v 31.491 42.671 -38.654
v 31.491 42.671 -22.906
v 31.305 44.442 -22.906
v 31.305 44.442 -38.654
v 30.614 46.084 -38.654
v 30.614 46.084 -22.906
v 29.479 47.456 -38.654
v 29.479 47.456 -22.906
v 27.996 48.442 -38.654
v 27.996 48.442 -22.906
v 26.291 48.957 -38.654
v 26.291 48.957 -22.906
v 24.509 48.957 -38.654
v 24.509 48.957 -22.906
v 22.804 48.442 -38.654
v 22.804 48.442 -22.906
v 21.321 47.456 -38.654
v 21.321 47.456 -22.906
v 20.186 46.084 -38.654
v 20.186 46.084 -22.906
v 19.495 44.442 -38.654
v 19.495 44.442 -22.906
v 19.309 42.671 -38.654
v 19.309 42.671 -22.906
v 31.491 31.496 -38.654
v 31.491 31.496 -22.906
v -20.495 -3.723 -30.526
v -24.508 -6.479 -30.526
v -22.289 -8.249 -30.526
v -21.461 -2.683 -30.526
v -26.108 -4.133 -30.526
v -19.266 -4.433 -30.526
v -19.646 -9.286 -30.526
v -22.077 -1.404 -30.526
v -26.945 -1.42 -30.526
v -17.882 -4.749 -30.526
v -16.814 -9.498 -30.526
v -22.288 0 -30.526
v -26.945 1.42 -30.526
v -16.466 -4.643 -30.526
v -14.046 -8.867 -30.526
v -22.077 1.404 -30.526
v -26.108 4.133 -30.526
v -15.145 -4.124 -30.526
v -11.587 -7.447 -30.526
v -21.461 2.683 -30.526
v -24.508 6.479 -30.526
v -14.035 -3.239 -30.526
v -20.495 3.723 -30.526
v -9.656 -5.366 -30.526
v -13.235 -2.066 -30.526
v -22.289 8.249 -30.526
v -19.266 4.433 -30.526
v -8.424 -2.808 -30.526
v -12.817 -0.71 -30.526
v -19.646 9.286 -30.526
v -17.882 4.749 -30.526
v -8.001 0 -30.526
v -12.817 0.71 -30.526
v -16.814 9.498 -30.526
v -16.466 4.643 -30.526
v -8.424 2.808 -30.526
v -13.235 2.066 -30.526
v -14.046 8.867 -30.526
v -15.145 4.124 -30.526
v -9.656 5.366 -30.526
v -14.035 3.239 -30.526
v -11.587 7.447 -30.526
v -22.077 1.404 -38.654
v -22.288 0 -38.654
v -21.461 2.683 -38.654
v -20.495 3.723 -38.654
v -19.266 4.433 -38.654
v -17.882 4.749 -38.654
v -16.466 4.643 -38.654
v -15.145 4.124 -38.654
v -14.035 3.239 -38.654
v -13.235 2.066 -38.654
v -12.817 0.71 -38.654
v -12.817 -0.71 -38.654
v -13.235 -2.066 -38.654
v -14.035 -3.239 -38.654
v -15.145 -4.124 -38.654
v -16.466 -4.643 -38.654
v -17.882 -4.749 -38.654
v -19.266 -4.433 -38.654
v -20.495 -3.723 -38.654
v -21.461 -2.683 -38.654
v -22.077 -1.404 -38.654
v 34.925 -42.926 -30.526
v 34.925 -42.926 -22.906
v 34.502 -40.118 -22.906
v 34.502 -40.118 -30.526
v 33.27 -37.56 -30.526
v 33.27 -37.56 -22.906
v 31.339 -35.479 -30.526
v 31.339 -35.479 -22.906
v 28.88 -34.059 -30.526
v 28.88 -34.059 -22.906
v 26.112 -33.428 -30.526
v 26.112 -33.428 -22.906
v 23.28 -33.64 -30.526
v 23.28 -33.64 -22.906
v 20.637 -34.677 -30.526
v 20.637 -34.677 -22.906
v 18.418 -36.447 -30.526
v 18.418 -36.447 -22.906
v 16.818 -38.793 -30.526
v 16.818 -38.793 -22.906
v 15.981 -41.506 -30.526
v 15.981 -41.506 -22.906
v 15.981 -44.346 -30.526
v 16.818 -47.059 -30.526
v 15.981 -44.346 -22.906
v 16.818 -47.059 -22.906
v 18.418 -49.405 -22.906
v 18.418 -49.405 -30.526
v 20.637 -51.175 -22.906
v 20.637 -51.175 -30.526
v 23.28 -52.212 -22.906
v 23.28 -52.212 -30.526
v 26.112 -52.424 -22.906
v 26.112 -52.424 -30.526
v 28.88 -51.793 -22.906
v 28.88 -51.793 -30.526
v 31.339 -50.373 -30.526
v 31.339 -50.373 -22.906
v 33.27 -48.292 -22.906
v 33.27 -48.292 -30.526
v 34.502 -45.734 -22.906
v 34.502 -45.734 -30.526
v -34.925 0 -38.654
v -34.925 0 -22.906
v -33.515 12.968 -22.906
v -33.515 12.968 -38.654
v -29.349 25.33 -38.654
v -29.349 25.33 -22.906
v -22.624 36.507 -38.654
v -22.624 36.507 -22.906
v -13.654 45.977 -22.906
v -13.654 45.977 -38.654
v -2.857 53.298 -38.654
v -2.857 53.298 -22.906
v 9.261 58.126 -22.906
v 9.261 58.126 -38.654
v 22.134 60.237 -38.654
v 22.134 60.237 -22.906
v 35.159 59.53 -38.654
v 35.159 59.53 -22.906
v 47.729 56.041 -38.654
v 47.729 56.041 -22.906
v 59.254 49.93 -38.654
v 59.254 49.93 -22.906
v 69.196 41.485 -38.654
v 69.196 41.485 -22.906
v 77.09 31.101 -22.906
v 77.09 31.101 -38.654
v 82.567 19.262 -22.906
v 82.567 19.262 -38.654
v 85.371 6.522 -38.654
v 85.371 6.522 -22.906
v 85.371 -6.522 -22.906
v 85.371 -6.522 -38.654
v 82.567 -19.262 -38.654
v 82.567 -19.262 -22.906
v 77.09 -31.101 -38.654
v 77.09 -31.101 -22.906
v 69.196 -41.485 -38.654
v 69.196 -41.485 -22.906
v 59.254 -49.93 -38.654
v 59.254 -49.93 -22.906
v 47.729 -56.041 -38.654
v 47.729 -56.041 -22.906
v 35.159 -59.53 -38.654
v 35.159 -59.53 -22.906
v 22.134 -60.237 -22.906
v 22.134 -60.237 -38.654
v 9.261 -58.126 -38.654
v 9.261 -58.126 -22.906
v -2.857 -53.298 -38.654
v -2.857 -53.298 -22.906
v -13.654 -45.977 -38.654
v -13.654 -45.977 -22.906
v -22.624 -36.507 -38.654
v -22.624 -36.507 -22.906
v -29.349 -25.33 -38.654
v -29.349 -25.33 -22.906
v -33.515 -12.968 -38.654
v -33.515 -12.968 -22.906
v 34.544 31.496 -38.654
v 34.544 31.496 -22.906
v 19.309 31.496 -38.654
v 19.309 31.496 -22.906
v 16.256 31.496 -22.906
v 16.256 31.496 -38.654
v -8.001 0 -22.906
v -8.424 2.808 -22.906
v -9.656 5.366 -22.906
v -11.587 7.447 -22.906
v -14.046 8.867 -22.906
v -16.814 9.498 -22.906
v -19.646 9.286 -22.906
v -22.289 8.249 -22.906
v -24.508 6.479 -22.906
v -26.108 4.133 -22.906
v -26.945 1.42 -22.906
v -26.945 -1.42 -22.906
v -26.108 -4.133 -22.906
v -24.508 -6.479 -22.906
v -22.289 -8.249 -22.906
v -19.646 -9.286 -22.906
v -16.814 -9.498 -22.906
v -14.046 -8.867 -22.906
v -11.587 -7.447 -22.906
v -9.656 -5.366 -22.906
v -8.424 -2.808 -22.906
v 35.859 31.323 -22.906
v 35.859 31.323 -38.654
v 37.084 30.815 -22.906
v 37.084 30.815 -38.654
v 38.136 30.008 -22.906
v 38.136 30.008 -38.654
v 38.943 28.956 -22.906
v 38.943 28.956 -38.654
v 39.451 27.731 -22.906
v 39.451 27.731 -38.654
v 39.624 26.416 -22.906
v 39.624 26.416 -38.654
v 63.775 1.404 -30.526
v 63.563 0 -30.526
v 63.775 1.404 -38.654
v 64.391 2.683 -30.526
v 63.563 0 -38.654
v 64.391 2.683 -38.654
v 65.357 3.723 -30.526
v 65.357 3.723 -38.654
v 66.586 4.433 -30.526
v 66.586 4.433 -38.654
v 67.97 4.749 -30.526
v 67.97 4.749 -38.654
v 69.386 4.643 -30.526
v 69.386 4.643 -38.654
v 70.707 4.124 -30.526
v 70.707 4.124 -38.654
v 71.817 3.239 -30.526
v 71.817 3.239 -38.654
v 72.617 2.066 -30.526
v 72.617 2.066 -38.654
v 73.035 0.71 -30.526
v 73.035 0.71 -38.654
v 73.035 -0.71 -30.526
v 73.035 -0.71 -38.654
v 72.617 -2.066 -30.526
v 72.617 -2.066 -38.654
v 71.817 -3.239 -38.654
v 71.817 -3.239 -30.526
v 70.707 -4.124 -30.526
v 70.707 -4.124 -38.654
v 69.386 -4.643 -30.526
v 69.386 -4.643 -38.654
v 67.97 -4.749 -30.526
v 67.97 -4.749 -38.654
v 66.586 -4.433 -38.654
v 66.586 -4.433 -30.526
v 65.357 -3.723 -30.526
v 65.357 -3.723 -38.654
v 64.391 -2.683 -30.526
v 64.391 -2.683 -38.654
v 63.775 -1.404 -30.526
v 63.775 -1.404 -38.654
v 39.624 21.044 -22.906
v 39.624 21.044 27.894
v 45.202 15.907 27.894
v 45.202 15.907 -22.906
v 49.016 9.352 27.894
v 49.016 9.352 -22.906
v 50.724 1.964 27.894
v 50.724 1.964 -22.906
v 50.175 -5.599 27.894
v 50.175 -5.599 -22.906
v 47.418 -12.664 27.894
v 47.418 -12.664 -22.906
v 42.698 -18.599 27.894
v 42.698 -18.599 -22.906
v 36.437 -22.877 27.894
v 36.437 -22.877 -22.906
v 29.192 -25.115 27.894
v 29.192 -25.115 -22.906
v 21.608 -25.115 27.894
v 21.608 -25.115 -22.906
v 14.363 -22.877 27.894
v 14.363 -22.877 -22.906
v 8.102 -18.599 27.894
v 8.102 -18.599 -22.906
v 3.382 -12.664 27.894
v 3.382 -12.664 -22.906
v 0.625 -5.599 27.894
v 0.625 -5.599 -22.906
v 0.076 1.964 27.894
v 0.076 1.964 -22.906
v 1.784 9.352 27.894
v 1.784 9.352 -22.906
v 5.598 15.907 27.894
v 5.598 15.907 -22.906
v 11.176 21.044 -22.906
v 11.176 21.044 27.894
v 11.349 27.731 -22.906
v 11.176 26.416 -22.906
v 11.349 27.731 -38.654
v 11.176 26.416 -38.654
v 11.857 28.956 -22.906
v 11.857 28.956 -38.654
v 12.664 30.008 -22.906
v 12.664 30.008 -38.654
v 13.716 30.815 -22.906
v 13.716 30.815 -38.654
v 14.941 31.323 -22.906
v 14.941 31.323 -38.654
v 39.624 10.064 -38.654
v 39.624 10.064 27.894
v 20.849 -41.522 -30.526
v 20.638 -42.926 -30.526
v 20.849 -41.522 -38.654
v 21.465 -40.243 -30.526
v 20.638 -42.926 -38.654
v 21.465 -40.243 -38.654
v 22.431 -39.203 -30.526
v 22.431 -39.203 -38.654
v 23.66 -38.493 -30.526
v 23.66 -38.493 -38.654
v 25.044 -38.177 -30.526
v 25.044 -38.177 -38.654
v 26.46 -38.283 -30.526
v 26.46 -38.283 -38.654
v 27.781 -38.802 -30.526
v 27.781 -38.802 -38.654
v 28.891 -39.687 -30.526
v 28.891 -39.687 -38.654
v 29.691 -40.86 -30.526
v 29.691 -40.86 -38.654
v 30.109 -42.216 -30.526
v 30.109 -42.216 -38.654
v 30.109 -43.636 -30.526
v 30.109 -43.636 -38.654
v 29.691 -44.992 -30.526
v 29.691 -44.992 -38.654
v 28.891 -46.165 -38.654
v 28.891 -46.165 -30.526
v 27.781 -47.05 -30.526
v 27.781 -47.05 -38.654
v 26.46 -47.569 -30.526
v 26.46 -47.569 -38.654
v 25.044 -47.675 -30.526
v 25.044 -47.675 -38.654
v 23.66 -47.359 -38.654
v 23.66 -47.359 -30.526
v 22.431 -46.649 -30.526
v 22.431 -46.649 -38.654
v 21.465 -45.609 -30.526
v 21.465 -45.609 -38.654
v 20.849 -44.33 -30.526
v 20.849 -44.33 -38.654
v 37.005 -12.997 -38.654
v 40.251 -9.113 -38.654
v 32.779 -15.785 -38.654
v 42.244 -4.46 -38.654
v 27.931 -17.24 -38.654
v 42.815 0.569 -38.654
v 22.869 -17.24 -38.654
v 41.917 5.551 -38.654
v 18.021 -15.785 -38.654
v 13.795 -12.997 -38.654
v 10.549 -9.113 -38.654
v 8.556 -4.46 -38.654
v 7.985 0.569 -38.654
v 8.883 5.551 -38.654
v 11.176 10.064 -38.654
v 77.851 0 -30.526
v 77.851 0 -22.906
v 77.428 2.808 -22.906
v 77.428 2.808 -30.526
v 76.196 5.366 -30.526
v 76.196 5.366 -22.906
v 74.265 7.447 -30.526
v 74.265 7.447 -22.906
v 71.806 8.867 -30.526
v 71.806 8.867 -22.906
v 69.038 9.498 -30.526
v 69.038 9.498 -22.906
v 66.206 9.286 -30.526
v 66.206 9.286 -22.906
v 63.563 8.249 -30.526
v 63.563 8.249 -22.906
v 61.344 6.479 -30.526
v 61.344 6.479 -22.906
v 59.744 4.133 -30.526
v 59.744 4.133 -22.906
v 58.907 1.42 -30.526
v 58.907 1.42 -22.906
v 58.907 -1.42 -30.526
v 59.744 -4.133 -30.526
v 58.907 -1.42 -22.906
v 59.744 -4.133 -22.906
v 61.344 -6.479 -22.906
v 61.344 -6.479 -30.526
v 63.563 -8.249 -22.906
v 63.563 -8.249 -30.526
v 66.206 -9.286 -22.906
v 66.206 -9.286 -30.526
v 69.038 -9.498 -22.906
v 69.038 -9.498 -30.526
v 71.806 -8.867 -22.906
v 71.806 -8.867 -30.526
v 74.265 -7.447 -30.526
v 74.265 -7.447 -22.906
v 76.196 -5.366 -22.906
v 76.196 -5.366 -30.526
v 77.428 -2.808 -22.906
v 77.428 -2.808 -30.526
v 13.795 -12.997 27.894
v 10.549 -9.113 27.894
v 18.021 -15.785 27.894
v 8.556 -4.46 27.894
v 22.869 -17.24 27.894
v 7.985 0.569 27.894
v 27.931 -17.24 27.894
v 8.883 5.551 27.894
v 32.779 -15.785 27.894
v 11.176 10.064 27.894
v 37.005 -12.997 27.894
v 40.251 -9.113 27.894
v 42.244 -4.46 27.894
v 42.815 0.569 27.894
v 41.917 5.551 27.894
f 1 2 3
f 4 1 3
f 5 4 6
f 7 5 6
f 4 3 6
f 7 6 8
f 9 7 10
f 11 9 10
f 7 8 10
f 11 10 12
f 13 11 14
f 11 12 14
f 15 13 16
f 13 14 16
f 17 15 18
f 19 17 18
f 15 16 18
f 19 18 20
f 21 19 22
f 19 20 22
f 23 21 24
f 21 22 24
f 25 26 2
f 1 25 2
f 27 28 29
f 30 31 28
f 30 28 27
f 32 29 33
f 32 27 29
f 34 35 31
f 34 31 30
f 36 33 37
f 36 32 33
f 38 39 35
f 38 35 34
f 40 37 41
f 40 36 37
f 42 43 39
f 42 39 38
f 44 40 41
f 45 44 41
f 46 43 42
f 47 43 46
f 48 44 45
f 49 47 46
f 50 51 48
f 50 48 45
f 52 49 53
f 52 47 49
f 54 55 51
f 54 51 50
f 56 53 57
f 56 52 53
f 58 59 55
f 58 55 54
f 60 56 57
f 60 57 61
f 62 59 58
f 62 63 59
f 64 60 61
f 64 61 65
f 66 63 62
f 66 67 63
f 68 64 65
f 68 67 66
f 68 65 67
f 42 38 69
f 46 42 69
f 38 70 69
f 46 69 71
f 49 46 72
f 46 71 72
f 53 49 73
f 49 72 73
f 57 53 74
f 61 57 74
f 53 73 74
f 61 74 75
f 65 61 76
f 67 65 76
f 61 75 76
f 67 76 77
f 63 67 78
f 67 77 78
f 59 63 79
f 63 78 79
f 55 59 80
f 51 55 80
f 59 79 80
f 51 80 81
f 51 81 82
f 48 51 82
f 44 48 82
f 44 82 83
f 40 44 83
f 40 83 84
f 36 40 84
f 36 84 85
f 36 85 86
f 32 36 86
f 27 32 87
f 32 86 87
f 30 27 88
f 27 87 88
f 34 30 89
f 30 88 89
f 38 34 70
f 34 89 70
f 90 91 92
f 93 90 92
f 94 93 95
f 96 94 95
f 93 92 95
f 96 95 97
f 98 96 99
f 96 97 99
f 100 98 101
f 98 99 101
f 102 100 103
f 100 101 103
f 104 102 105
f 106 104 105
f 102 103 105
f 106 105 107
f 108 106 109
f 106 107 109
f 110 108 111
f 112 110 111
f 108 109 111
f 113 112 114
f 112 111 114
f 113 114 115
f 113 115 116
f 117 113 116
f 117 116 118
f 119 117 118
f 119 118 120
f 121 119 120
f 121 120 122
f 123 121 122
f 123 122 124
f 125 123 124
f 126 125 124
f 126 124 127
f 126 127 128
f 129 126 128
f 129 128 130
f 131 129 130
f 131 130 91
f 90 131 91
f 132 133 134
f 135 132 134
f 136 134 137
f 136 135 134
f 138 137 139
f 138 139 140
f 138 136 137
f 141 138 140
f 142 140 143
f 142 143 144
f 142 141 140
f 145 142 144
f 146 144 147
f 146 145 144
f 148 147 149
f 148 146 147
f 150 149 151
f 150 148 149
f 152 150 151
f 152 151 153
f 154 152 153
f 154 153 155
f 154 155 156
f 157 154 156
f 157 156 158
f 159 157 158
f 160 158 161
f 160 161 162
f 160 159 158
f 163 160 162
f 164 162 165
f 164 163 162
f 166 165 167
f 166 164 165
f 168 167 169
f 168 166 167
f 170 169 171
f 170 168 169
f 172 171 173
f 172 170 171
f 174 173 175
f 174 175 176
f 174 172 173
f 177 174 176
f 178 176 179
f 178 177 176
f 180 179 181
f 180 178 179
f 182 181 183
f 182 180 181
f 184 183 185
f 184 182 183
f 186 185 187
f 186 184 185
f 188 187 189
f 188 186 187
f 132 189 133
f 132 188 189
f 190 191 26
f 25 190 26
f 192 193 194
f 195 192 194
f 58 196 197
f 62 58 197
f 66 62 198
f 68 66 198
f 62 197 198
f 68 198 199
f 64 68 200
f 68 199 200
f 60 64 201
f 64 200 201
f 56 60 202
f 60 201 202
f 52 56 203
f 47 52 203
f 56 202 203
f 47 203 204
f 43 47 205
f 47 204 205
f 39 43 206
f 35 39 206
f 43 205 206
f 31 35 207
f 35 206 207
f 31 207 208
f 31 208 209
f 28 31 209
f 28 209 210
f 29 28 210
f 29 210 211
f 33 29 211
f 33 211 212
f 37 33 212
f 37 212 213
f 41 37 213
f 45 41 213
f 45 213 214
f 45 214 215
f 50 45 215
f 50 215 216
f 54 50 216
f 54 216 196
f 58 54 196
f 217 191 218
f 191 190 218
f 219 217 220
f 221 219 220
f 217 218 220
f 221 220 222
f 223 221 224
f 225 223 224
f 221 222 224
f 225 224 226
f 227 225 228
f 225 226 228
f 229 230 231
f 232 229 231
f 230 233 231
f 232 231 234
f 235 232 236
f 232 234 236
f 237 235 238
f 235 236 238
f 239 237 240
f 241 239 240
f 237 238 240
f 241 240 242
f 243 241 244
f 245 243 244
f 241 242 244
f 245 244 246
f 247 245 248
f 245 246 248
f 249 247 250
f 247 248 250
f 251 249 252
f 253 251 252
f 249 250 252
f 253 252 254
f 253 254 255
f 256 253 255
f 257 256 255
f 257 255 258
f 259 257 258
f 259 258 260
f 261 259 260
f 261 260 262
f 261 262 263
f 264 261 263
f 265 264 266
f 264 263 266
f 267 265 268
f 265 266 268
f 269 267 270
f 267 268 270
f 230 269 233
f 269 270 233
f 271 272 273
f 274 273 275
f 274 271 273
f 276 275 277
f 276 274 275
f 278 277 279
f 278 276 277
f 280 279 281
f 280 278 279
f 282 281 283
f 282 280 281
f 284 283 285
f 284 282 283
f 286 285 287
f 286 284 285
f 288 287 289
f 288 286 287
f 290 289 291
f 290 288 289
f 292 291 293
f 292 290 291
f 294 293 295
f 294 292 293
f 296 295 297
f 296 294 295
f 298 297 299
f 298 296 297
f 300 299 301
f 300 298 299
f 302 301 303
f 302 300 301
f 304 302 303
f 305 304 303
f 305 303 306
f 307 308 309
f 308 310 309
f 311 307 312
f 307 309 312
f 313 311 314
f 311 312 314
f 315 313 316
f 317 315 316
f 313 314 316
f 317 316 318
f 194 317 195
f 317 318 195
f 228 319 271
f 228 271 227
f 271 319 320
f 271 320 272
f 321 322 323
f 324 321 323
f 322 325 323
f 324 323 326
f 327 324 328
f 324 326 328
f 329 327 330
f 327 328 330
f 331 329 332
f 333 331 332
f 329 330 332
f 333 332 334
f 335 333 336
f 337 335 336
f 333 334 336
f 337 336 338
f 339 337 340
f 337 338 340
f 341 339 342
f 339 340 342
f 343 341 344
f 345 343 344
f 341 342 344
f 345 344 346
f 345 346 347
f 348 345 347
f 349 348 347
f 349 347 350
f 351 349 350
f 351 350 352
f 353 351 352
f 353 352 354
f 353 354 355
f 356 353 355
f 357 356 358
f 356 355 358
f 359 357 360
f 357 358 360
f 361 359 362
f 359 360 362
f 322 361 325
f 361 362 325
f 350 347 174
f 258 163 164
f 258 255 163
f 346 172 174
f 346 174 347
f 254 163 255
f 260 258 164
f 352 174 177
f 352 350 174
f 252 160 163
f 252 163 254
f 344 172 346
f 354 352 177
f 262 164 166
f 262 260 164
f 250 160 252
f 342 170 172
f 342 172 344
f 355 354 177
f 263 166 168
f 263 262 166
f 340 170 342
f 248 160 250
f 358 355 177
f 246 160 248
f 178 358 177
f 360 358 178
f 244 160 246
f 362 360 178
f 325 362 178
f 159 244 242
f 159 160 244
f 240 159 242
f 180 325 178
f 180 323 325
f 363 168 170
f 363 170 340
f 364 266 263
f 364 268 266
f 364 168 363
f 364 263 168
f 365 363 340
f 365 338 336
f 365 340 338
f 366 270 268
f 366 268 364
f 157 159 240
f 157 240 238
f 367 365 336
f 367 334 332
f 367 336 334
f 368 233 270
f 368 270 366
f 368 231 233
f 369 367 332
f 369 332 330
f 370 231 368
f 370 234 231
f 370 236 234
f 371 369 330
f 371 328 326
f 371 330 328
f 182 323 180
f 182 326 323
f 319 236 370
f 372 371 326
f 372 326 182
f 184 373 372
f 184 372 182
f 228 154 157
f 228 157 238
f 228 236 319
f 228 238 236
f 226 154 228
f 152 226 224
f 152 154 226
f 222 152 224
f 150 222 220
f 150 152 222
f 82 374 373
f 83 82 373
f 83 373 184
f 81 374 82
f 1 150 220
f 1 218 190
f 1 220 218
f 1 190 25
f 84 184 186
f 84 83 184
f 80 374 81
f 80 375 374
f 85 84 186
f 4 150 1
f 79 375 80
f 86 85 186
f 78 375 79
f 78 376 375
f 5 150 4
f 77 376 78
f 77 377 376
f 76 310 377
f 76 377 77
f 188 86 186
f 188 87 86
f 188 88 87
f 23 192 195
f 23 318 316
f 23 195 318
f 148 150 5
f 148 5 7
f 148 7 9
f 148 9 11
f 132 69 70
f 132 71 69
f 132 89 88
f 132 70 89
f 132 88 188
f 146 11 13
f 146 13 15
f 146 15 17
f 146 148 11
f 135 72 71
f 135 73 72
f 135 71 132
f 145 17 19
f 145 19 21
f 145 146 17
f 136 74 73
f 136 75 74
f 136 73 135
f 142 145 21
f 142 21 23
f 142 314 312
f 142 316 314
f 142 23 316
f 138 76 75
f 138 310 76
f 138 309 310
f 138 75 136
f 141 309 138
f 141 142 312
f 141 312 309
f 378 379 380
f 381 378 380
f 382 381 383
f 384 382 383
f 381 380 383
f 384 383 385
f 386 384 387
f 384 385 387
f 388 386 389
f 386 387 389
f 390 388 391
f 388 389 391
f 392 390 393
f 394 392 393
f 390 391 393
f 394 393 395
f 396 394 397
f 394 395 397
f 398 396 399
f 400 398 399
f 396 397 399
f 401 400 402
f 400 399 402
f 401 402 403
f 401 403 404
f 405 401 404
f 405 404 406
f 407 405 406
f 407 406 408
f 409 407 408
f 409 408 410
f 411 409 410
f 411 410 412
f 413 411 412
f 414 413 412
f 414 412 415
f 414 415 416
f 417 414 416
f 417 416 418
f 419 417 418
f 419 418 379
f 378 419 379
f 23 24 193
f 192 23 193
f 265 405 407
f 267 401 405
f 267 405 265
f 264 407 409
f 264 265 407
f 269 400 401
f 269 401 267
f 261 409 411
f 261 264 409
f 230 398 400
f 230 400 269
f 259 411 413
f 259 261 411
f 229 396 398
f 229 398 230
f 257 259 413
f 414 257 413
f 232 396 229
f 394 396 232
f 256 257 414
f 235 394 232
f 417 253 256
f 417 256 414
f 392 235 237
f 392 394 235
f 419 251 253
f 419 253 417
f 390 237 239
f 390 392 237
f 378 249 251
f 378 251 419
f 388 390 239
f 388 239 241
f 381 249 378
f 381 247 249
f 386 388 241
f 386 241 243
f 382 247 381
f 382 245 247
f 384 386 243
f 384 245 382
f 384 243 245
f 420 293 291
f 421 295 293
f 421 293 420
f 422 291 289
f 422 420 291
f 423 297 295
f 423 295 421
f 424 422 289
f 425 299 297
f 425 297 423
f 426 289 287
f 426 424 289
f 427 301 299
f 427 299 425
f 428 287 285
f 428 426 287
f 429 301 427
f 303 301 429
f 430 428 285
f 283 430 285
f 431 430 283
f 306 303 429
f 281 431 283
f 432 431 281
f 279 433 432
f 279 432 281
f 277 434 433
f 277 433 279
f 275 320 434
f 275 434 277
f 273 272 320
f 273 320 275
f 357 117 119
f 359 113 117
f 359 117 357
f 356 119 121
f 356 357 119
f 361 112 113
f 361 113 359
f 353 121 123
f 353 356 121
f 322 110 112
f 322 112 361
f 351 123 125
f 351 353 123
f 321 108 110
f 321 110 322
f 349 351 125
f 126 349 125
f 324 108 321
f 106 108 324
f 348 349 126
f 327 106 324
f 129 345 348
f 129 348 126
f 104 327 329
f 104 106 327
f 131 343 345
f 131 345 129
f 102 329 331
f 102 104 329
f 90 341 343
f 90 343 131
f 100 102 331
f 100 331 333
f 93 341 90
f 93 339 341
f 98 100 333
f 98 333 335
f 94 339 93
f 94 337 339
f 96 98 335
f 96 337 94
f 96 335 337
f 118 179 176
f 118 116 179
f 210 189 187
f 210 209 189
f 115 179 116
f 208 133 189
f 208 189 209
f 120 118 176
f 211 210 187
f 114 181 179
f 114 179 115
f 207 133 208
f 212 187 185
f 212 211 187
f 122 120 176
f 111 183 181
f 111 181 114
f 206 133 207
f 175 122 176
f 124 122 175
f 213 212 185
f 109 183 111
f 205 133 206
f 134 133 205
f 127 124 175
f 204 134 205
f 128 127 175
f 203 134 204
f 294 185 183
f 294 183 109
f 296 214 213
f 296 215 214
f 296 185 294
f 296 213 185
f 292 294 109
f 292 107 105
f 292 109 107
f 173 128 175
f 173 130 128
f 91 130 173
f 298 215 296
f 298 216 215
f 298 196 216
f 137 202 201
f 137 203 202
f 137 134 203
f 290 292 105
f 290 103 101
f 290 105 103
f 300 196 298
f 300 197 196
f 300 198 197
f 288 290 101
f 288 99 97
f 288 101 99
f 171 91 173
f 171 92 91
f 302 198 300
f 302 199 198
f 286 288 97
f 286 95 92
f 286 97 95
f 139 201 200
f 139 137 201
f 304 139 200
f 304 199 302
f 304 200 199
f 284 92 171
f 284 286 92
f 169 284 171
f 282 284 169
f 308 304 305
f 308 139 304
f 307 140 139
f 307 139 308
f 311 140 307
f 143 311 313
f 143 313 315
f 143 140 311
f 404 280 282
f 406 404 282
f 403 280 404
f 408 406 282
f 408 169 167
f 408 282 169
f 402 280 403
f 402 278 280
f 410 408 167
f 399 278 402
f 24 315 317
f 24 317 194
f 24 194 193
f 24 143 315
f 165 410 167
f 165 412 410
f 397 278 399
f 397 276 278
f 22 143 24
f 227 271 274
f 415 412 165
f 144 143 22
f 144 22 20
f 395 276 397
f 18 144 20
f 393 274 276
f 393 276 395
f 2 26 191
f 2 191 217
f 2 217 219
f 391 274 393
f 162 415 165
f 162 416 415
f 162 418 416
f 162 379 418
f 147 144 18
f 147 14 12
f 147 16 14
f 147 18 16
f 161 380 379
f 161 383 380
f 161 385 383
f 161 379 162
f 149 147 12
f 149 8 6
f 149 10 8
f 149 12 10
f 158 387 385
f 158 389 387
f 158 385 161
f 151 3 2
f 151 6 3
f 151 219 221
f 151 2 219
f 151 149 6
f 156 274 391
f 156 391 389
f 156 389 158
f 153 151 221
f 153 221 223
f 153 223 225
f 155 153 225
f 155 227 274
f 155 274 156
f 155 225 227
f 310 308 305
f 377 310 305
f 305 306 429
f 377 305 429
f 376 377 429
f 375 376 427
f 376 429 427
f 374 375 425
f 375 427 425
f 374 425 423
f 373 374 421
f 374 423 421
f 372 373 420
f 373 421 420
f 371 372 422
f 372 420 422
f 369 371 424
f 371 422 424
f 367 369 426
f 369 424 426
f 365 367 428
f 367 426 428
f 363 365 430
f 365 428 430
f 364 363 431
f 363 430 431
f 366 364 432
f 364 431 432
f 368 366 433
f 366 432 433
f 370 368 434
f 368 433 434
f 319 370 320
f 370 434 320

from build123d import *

# Parameters (mm, degrees)
F2_R           = 17.4244
F3_DEPTH       = 101.6
F5_D           = 9.525
F5_CBORE_D     = 19.05
F5_CBORE_DEPTH = 7.62
F7_DEPTH       = 838.2
F8_R           = 5.08


with BuildPart() as f1:
    # F0 (on Front) → F1 (revolve)
    with BuildSketch(Plane.XZ):
        Polygon((25.4, -38.654042), (25.4, 27.893958), (0, 27.893958), (0, -22.906042), (-34.925, -22.906042), (-34.925, -38.654042), align=None)
    revolve(axis=Axis((25.4, 0, -5.380042), (0, 0, -1)))

    # F2 (on face) → F3 (cut)
    with BuildSketch(Plane.XY.offset(27.893958)):
        with Locations((25.4, 0)):
            Circle(F2_R)
    extrude(amount=-F3_DEPTH, mode=Mode.SUBTRACT)

    # F5 (through all)
    with Locations(Plane.XY.offset(-22.906042)):
        with Locations((-17.526, 0), (25.4, -42.926), (68.326, 0)):
            CounterBoreHole(F5_D / 2, F5_CBORE_D / 2, F5_CBORE_DEPTH)

    # F6 (on face) → F7 (cut)
    with BuildSketch(Plane.XY.offset(27.893958)):
        with BuildLine():
            Line((11.176, 0), (39.624, 0))
            Line((39.624, 0), (39.624, 31.496))
            Line((39.624, 31.496), (31.490646, 31.496))
            Line((31.490646, 31.496), (31.490646, 42.67057))
            ThreePointArc((31.490646, 42.67057), (25.4, 49.022), (19.309354, 42.67057))
            Line((19.309354, 42.67057), (19.309354, 31.496))
            Line((19.309354, 31.496), (11.176, 31.496))
            Line((11.176, 31.496), (11.176, 0))
        make_face()
    extrude(amount=-F7_DEPTH, mode=Mode.SUBTRACT)

    # F8
    f8_edges = [f1.edges().sort_by_distance(p)[0] for p in [
        (11.176, 31.496, -30.780042),
        (39.624, 31.496, -30.780042),
    ]]
    fillet(f8_edges, radius=F8_R)


solid = f1.part
